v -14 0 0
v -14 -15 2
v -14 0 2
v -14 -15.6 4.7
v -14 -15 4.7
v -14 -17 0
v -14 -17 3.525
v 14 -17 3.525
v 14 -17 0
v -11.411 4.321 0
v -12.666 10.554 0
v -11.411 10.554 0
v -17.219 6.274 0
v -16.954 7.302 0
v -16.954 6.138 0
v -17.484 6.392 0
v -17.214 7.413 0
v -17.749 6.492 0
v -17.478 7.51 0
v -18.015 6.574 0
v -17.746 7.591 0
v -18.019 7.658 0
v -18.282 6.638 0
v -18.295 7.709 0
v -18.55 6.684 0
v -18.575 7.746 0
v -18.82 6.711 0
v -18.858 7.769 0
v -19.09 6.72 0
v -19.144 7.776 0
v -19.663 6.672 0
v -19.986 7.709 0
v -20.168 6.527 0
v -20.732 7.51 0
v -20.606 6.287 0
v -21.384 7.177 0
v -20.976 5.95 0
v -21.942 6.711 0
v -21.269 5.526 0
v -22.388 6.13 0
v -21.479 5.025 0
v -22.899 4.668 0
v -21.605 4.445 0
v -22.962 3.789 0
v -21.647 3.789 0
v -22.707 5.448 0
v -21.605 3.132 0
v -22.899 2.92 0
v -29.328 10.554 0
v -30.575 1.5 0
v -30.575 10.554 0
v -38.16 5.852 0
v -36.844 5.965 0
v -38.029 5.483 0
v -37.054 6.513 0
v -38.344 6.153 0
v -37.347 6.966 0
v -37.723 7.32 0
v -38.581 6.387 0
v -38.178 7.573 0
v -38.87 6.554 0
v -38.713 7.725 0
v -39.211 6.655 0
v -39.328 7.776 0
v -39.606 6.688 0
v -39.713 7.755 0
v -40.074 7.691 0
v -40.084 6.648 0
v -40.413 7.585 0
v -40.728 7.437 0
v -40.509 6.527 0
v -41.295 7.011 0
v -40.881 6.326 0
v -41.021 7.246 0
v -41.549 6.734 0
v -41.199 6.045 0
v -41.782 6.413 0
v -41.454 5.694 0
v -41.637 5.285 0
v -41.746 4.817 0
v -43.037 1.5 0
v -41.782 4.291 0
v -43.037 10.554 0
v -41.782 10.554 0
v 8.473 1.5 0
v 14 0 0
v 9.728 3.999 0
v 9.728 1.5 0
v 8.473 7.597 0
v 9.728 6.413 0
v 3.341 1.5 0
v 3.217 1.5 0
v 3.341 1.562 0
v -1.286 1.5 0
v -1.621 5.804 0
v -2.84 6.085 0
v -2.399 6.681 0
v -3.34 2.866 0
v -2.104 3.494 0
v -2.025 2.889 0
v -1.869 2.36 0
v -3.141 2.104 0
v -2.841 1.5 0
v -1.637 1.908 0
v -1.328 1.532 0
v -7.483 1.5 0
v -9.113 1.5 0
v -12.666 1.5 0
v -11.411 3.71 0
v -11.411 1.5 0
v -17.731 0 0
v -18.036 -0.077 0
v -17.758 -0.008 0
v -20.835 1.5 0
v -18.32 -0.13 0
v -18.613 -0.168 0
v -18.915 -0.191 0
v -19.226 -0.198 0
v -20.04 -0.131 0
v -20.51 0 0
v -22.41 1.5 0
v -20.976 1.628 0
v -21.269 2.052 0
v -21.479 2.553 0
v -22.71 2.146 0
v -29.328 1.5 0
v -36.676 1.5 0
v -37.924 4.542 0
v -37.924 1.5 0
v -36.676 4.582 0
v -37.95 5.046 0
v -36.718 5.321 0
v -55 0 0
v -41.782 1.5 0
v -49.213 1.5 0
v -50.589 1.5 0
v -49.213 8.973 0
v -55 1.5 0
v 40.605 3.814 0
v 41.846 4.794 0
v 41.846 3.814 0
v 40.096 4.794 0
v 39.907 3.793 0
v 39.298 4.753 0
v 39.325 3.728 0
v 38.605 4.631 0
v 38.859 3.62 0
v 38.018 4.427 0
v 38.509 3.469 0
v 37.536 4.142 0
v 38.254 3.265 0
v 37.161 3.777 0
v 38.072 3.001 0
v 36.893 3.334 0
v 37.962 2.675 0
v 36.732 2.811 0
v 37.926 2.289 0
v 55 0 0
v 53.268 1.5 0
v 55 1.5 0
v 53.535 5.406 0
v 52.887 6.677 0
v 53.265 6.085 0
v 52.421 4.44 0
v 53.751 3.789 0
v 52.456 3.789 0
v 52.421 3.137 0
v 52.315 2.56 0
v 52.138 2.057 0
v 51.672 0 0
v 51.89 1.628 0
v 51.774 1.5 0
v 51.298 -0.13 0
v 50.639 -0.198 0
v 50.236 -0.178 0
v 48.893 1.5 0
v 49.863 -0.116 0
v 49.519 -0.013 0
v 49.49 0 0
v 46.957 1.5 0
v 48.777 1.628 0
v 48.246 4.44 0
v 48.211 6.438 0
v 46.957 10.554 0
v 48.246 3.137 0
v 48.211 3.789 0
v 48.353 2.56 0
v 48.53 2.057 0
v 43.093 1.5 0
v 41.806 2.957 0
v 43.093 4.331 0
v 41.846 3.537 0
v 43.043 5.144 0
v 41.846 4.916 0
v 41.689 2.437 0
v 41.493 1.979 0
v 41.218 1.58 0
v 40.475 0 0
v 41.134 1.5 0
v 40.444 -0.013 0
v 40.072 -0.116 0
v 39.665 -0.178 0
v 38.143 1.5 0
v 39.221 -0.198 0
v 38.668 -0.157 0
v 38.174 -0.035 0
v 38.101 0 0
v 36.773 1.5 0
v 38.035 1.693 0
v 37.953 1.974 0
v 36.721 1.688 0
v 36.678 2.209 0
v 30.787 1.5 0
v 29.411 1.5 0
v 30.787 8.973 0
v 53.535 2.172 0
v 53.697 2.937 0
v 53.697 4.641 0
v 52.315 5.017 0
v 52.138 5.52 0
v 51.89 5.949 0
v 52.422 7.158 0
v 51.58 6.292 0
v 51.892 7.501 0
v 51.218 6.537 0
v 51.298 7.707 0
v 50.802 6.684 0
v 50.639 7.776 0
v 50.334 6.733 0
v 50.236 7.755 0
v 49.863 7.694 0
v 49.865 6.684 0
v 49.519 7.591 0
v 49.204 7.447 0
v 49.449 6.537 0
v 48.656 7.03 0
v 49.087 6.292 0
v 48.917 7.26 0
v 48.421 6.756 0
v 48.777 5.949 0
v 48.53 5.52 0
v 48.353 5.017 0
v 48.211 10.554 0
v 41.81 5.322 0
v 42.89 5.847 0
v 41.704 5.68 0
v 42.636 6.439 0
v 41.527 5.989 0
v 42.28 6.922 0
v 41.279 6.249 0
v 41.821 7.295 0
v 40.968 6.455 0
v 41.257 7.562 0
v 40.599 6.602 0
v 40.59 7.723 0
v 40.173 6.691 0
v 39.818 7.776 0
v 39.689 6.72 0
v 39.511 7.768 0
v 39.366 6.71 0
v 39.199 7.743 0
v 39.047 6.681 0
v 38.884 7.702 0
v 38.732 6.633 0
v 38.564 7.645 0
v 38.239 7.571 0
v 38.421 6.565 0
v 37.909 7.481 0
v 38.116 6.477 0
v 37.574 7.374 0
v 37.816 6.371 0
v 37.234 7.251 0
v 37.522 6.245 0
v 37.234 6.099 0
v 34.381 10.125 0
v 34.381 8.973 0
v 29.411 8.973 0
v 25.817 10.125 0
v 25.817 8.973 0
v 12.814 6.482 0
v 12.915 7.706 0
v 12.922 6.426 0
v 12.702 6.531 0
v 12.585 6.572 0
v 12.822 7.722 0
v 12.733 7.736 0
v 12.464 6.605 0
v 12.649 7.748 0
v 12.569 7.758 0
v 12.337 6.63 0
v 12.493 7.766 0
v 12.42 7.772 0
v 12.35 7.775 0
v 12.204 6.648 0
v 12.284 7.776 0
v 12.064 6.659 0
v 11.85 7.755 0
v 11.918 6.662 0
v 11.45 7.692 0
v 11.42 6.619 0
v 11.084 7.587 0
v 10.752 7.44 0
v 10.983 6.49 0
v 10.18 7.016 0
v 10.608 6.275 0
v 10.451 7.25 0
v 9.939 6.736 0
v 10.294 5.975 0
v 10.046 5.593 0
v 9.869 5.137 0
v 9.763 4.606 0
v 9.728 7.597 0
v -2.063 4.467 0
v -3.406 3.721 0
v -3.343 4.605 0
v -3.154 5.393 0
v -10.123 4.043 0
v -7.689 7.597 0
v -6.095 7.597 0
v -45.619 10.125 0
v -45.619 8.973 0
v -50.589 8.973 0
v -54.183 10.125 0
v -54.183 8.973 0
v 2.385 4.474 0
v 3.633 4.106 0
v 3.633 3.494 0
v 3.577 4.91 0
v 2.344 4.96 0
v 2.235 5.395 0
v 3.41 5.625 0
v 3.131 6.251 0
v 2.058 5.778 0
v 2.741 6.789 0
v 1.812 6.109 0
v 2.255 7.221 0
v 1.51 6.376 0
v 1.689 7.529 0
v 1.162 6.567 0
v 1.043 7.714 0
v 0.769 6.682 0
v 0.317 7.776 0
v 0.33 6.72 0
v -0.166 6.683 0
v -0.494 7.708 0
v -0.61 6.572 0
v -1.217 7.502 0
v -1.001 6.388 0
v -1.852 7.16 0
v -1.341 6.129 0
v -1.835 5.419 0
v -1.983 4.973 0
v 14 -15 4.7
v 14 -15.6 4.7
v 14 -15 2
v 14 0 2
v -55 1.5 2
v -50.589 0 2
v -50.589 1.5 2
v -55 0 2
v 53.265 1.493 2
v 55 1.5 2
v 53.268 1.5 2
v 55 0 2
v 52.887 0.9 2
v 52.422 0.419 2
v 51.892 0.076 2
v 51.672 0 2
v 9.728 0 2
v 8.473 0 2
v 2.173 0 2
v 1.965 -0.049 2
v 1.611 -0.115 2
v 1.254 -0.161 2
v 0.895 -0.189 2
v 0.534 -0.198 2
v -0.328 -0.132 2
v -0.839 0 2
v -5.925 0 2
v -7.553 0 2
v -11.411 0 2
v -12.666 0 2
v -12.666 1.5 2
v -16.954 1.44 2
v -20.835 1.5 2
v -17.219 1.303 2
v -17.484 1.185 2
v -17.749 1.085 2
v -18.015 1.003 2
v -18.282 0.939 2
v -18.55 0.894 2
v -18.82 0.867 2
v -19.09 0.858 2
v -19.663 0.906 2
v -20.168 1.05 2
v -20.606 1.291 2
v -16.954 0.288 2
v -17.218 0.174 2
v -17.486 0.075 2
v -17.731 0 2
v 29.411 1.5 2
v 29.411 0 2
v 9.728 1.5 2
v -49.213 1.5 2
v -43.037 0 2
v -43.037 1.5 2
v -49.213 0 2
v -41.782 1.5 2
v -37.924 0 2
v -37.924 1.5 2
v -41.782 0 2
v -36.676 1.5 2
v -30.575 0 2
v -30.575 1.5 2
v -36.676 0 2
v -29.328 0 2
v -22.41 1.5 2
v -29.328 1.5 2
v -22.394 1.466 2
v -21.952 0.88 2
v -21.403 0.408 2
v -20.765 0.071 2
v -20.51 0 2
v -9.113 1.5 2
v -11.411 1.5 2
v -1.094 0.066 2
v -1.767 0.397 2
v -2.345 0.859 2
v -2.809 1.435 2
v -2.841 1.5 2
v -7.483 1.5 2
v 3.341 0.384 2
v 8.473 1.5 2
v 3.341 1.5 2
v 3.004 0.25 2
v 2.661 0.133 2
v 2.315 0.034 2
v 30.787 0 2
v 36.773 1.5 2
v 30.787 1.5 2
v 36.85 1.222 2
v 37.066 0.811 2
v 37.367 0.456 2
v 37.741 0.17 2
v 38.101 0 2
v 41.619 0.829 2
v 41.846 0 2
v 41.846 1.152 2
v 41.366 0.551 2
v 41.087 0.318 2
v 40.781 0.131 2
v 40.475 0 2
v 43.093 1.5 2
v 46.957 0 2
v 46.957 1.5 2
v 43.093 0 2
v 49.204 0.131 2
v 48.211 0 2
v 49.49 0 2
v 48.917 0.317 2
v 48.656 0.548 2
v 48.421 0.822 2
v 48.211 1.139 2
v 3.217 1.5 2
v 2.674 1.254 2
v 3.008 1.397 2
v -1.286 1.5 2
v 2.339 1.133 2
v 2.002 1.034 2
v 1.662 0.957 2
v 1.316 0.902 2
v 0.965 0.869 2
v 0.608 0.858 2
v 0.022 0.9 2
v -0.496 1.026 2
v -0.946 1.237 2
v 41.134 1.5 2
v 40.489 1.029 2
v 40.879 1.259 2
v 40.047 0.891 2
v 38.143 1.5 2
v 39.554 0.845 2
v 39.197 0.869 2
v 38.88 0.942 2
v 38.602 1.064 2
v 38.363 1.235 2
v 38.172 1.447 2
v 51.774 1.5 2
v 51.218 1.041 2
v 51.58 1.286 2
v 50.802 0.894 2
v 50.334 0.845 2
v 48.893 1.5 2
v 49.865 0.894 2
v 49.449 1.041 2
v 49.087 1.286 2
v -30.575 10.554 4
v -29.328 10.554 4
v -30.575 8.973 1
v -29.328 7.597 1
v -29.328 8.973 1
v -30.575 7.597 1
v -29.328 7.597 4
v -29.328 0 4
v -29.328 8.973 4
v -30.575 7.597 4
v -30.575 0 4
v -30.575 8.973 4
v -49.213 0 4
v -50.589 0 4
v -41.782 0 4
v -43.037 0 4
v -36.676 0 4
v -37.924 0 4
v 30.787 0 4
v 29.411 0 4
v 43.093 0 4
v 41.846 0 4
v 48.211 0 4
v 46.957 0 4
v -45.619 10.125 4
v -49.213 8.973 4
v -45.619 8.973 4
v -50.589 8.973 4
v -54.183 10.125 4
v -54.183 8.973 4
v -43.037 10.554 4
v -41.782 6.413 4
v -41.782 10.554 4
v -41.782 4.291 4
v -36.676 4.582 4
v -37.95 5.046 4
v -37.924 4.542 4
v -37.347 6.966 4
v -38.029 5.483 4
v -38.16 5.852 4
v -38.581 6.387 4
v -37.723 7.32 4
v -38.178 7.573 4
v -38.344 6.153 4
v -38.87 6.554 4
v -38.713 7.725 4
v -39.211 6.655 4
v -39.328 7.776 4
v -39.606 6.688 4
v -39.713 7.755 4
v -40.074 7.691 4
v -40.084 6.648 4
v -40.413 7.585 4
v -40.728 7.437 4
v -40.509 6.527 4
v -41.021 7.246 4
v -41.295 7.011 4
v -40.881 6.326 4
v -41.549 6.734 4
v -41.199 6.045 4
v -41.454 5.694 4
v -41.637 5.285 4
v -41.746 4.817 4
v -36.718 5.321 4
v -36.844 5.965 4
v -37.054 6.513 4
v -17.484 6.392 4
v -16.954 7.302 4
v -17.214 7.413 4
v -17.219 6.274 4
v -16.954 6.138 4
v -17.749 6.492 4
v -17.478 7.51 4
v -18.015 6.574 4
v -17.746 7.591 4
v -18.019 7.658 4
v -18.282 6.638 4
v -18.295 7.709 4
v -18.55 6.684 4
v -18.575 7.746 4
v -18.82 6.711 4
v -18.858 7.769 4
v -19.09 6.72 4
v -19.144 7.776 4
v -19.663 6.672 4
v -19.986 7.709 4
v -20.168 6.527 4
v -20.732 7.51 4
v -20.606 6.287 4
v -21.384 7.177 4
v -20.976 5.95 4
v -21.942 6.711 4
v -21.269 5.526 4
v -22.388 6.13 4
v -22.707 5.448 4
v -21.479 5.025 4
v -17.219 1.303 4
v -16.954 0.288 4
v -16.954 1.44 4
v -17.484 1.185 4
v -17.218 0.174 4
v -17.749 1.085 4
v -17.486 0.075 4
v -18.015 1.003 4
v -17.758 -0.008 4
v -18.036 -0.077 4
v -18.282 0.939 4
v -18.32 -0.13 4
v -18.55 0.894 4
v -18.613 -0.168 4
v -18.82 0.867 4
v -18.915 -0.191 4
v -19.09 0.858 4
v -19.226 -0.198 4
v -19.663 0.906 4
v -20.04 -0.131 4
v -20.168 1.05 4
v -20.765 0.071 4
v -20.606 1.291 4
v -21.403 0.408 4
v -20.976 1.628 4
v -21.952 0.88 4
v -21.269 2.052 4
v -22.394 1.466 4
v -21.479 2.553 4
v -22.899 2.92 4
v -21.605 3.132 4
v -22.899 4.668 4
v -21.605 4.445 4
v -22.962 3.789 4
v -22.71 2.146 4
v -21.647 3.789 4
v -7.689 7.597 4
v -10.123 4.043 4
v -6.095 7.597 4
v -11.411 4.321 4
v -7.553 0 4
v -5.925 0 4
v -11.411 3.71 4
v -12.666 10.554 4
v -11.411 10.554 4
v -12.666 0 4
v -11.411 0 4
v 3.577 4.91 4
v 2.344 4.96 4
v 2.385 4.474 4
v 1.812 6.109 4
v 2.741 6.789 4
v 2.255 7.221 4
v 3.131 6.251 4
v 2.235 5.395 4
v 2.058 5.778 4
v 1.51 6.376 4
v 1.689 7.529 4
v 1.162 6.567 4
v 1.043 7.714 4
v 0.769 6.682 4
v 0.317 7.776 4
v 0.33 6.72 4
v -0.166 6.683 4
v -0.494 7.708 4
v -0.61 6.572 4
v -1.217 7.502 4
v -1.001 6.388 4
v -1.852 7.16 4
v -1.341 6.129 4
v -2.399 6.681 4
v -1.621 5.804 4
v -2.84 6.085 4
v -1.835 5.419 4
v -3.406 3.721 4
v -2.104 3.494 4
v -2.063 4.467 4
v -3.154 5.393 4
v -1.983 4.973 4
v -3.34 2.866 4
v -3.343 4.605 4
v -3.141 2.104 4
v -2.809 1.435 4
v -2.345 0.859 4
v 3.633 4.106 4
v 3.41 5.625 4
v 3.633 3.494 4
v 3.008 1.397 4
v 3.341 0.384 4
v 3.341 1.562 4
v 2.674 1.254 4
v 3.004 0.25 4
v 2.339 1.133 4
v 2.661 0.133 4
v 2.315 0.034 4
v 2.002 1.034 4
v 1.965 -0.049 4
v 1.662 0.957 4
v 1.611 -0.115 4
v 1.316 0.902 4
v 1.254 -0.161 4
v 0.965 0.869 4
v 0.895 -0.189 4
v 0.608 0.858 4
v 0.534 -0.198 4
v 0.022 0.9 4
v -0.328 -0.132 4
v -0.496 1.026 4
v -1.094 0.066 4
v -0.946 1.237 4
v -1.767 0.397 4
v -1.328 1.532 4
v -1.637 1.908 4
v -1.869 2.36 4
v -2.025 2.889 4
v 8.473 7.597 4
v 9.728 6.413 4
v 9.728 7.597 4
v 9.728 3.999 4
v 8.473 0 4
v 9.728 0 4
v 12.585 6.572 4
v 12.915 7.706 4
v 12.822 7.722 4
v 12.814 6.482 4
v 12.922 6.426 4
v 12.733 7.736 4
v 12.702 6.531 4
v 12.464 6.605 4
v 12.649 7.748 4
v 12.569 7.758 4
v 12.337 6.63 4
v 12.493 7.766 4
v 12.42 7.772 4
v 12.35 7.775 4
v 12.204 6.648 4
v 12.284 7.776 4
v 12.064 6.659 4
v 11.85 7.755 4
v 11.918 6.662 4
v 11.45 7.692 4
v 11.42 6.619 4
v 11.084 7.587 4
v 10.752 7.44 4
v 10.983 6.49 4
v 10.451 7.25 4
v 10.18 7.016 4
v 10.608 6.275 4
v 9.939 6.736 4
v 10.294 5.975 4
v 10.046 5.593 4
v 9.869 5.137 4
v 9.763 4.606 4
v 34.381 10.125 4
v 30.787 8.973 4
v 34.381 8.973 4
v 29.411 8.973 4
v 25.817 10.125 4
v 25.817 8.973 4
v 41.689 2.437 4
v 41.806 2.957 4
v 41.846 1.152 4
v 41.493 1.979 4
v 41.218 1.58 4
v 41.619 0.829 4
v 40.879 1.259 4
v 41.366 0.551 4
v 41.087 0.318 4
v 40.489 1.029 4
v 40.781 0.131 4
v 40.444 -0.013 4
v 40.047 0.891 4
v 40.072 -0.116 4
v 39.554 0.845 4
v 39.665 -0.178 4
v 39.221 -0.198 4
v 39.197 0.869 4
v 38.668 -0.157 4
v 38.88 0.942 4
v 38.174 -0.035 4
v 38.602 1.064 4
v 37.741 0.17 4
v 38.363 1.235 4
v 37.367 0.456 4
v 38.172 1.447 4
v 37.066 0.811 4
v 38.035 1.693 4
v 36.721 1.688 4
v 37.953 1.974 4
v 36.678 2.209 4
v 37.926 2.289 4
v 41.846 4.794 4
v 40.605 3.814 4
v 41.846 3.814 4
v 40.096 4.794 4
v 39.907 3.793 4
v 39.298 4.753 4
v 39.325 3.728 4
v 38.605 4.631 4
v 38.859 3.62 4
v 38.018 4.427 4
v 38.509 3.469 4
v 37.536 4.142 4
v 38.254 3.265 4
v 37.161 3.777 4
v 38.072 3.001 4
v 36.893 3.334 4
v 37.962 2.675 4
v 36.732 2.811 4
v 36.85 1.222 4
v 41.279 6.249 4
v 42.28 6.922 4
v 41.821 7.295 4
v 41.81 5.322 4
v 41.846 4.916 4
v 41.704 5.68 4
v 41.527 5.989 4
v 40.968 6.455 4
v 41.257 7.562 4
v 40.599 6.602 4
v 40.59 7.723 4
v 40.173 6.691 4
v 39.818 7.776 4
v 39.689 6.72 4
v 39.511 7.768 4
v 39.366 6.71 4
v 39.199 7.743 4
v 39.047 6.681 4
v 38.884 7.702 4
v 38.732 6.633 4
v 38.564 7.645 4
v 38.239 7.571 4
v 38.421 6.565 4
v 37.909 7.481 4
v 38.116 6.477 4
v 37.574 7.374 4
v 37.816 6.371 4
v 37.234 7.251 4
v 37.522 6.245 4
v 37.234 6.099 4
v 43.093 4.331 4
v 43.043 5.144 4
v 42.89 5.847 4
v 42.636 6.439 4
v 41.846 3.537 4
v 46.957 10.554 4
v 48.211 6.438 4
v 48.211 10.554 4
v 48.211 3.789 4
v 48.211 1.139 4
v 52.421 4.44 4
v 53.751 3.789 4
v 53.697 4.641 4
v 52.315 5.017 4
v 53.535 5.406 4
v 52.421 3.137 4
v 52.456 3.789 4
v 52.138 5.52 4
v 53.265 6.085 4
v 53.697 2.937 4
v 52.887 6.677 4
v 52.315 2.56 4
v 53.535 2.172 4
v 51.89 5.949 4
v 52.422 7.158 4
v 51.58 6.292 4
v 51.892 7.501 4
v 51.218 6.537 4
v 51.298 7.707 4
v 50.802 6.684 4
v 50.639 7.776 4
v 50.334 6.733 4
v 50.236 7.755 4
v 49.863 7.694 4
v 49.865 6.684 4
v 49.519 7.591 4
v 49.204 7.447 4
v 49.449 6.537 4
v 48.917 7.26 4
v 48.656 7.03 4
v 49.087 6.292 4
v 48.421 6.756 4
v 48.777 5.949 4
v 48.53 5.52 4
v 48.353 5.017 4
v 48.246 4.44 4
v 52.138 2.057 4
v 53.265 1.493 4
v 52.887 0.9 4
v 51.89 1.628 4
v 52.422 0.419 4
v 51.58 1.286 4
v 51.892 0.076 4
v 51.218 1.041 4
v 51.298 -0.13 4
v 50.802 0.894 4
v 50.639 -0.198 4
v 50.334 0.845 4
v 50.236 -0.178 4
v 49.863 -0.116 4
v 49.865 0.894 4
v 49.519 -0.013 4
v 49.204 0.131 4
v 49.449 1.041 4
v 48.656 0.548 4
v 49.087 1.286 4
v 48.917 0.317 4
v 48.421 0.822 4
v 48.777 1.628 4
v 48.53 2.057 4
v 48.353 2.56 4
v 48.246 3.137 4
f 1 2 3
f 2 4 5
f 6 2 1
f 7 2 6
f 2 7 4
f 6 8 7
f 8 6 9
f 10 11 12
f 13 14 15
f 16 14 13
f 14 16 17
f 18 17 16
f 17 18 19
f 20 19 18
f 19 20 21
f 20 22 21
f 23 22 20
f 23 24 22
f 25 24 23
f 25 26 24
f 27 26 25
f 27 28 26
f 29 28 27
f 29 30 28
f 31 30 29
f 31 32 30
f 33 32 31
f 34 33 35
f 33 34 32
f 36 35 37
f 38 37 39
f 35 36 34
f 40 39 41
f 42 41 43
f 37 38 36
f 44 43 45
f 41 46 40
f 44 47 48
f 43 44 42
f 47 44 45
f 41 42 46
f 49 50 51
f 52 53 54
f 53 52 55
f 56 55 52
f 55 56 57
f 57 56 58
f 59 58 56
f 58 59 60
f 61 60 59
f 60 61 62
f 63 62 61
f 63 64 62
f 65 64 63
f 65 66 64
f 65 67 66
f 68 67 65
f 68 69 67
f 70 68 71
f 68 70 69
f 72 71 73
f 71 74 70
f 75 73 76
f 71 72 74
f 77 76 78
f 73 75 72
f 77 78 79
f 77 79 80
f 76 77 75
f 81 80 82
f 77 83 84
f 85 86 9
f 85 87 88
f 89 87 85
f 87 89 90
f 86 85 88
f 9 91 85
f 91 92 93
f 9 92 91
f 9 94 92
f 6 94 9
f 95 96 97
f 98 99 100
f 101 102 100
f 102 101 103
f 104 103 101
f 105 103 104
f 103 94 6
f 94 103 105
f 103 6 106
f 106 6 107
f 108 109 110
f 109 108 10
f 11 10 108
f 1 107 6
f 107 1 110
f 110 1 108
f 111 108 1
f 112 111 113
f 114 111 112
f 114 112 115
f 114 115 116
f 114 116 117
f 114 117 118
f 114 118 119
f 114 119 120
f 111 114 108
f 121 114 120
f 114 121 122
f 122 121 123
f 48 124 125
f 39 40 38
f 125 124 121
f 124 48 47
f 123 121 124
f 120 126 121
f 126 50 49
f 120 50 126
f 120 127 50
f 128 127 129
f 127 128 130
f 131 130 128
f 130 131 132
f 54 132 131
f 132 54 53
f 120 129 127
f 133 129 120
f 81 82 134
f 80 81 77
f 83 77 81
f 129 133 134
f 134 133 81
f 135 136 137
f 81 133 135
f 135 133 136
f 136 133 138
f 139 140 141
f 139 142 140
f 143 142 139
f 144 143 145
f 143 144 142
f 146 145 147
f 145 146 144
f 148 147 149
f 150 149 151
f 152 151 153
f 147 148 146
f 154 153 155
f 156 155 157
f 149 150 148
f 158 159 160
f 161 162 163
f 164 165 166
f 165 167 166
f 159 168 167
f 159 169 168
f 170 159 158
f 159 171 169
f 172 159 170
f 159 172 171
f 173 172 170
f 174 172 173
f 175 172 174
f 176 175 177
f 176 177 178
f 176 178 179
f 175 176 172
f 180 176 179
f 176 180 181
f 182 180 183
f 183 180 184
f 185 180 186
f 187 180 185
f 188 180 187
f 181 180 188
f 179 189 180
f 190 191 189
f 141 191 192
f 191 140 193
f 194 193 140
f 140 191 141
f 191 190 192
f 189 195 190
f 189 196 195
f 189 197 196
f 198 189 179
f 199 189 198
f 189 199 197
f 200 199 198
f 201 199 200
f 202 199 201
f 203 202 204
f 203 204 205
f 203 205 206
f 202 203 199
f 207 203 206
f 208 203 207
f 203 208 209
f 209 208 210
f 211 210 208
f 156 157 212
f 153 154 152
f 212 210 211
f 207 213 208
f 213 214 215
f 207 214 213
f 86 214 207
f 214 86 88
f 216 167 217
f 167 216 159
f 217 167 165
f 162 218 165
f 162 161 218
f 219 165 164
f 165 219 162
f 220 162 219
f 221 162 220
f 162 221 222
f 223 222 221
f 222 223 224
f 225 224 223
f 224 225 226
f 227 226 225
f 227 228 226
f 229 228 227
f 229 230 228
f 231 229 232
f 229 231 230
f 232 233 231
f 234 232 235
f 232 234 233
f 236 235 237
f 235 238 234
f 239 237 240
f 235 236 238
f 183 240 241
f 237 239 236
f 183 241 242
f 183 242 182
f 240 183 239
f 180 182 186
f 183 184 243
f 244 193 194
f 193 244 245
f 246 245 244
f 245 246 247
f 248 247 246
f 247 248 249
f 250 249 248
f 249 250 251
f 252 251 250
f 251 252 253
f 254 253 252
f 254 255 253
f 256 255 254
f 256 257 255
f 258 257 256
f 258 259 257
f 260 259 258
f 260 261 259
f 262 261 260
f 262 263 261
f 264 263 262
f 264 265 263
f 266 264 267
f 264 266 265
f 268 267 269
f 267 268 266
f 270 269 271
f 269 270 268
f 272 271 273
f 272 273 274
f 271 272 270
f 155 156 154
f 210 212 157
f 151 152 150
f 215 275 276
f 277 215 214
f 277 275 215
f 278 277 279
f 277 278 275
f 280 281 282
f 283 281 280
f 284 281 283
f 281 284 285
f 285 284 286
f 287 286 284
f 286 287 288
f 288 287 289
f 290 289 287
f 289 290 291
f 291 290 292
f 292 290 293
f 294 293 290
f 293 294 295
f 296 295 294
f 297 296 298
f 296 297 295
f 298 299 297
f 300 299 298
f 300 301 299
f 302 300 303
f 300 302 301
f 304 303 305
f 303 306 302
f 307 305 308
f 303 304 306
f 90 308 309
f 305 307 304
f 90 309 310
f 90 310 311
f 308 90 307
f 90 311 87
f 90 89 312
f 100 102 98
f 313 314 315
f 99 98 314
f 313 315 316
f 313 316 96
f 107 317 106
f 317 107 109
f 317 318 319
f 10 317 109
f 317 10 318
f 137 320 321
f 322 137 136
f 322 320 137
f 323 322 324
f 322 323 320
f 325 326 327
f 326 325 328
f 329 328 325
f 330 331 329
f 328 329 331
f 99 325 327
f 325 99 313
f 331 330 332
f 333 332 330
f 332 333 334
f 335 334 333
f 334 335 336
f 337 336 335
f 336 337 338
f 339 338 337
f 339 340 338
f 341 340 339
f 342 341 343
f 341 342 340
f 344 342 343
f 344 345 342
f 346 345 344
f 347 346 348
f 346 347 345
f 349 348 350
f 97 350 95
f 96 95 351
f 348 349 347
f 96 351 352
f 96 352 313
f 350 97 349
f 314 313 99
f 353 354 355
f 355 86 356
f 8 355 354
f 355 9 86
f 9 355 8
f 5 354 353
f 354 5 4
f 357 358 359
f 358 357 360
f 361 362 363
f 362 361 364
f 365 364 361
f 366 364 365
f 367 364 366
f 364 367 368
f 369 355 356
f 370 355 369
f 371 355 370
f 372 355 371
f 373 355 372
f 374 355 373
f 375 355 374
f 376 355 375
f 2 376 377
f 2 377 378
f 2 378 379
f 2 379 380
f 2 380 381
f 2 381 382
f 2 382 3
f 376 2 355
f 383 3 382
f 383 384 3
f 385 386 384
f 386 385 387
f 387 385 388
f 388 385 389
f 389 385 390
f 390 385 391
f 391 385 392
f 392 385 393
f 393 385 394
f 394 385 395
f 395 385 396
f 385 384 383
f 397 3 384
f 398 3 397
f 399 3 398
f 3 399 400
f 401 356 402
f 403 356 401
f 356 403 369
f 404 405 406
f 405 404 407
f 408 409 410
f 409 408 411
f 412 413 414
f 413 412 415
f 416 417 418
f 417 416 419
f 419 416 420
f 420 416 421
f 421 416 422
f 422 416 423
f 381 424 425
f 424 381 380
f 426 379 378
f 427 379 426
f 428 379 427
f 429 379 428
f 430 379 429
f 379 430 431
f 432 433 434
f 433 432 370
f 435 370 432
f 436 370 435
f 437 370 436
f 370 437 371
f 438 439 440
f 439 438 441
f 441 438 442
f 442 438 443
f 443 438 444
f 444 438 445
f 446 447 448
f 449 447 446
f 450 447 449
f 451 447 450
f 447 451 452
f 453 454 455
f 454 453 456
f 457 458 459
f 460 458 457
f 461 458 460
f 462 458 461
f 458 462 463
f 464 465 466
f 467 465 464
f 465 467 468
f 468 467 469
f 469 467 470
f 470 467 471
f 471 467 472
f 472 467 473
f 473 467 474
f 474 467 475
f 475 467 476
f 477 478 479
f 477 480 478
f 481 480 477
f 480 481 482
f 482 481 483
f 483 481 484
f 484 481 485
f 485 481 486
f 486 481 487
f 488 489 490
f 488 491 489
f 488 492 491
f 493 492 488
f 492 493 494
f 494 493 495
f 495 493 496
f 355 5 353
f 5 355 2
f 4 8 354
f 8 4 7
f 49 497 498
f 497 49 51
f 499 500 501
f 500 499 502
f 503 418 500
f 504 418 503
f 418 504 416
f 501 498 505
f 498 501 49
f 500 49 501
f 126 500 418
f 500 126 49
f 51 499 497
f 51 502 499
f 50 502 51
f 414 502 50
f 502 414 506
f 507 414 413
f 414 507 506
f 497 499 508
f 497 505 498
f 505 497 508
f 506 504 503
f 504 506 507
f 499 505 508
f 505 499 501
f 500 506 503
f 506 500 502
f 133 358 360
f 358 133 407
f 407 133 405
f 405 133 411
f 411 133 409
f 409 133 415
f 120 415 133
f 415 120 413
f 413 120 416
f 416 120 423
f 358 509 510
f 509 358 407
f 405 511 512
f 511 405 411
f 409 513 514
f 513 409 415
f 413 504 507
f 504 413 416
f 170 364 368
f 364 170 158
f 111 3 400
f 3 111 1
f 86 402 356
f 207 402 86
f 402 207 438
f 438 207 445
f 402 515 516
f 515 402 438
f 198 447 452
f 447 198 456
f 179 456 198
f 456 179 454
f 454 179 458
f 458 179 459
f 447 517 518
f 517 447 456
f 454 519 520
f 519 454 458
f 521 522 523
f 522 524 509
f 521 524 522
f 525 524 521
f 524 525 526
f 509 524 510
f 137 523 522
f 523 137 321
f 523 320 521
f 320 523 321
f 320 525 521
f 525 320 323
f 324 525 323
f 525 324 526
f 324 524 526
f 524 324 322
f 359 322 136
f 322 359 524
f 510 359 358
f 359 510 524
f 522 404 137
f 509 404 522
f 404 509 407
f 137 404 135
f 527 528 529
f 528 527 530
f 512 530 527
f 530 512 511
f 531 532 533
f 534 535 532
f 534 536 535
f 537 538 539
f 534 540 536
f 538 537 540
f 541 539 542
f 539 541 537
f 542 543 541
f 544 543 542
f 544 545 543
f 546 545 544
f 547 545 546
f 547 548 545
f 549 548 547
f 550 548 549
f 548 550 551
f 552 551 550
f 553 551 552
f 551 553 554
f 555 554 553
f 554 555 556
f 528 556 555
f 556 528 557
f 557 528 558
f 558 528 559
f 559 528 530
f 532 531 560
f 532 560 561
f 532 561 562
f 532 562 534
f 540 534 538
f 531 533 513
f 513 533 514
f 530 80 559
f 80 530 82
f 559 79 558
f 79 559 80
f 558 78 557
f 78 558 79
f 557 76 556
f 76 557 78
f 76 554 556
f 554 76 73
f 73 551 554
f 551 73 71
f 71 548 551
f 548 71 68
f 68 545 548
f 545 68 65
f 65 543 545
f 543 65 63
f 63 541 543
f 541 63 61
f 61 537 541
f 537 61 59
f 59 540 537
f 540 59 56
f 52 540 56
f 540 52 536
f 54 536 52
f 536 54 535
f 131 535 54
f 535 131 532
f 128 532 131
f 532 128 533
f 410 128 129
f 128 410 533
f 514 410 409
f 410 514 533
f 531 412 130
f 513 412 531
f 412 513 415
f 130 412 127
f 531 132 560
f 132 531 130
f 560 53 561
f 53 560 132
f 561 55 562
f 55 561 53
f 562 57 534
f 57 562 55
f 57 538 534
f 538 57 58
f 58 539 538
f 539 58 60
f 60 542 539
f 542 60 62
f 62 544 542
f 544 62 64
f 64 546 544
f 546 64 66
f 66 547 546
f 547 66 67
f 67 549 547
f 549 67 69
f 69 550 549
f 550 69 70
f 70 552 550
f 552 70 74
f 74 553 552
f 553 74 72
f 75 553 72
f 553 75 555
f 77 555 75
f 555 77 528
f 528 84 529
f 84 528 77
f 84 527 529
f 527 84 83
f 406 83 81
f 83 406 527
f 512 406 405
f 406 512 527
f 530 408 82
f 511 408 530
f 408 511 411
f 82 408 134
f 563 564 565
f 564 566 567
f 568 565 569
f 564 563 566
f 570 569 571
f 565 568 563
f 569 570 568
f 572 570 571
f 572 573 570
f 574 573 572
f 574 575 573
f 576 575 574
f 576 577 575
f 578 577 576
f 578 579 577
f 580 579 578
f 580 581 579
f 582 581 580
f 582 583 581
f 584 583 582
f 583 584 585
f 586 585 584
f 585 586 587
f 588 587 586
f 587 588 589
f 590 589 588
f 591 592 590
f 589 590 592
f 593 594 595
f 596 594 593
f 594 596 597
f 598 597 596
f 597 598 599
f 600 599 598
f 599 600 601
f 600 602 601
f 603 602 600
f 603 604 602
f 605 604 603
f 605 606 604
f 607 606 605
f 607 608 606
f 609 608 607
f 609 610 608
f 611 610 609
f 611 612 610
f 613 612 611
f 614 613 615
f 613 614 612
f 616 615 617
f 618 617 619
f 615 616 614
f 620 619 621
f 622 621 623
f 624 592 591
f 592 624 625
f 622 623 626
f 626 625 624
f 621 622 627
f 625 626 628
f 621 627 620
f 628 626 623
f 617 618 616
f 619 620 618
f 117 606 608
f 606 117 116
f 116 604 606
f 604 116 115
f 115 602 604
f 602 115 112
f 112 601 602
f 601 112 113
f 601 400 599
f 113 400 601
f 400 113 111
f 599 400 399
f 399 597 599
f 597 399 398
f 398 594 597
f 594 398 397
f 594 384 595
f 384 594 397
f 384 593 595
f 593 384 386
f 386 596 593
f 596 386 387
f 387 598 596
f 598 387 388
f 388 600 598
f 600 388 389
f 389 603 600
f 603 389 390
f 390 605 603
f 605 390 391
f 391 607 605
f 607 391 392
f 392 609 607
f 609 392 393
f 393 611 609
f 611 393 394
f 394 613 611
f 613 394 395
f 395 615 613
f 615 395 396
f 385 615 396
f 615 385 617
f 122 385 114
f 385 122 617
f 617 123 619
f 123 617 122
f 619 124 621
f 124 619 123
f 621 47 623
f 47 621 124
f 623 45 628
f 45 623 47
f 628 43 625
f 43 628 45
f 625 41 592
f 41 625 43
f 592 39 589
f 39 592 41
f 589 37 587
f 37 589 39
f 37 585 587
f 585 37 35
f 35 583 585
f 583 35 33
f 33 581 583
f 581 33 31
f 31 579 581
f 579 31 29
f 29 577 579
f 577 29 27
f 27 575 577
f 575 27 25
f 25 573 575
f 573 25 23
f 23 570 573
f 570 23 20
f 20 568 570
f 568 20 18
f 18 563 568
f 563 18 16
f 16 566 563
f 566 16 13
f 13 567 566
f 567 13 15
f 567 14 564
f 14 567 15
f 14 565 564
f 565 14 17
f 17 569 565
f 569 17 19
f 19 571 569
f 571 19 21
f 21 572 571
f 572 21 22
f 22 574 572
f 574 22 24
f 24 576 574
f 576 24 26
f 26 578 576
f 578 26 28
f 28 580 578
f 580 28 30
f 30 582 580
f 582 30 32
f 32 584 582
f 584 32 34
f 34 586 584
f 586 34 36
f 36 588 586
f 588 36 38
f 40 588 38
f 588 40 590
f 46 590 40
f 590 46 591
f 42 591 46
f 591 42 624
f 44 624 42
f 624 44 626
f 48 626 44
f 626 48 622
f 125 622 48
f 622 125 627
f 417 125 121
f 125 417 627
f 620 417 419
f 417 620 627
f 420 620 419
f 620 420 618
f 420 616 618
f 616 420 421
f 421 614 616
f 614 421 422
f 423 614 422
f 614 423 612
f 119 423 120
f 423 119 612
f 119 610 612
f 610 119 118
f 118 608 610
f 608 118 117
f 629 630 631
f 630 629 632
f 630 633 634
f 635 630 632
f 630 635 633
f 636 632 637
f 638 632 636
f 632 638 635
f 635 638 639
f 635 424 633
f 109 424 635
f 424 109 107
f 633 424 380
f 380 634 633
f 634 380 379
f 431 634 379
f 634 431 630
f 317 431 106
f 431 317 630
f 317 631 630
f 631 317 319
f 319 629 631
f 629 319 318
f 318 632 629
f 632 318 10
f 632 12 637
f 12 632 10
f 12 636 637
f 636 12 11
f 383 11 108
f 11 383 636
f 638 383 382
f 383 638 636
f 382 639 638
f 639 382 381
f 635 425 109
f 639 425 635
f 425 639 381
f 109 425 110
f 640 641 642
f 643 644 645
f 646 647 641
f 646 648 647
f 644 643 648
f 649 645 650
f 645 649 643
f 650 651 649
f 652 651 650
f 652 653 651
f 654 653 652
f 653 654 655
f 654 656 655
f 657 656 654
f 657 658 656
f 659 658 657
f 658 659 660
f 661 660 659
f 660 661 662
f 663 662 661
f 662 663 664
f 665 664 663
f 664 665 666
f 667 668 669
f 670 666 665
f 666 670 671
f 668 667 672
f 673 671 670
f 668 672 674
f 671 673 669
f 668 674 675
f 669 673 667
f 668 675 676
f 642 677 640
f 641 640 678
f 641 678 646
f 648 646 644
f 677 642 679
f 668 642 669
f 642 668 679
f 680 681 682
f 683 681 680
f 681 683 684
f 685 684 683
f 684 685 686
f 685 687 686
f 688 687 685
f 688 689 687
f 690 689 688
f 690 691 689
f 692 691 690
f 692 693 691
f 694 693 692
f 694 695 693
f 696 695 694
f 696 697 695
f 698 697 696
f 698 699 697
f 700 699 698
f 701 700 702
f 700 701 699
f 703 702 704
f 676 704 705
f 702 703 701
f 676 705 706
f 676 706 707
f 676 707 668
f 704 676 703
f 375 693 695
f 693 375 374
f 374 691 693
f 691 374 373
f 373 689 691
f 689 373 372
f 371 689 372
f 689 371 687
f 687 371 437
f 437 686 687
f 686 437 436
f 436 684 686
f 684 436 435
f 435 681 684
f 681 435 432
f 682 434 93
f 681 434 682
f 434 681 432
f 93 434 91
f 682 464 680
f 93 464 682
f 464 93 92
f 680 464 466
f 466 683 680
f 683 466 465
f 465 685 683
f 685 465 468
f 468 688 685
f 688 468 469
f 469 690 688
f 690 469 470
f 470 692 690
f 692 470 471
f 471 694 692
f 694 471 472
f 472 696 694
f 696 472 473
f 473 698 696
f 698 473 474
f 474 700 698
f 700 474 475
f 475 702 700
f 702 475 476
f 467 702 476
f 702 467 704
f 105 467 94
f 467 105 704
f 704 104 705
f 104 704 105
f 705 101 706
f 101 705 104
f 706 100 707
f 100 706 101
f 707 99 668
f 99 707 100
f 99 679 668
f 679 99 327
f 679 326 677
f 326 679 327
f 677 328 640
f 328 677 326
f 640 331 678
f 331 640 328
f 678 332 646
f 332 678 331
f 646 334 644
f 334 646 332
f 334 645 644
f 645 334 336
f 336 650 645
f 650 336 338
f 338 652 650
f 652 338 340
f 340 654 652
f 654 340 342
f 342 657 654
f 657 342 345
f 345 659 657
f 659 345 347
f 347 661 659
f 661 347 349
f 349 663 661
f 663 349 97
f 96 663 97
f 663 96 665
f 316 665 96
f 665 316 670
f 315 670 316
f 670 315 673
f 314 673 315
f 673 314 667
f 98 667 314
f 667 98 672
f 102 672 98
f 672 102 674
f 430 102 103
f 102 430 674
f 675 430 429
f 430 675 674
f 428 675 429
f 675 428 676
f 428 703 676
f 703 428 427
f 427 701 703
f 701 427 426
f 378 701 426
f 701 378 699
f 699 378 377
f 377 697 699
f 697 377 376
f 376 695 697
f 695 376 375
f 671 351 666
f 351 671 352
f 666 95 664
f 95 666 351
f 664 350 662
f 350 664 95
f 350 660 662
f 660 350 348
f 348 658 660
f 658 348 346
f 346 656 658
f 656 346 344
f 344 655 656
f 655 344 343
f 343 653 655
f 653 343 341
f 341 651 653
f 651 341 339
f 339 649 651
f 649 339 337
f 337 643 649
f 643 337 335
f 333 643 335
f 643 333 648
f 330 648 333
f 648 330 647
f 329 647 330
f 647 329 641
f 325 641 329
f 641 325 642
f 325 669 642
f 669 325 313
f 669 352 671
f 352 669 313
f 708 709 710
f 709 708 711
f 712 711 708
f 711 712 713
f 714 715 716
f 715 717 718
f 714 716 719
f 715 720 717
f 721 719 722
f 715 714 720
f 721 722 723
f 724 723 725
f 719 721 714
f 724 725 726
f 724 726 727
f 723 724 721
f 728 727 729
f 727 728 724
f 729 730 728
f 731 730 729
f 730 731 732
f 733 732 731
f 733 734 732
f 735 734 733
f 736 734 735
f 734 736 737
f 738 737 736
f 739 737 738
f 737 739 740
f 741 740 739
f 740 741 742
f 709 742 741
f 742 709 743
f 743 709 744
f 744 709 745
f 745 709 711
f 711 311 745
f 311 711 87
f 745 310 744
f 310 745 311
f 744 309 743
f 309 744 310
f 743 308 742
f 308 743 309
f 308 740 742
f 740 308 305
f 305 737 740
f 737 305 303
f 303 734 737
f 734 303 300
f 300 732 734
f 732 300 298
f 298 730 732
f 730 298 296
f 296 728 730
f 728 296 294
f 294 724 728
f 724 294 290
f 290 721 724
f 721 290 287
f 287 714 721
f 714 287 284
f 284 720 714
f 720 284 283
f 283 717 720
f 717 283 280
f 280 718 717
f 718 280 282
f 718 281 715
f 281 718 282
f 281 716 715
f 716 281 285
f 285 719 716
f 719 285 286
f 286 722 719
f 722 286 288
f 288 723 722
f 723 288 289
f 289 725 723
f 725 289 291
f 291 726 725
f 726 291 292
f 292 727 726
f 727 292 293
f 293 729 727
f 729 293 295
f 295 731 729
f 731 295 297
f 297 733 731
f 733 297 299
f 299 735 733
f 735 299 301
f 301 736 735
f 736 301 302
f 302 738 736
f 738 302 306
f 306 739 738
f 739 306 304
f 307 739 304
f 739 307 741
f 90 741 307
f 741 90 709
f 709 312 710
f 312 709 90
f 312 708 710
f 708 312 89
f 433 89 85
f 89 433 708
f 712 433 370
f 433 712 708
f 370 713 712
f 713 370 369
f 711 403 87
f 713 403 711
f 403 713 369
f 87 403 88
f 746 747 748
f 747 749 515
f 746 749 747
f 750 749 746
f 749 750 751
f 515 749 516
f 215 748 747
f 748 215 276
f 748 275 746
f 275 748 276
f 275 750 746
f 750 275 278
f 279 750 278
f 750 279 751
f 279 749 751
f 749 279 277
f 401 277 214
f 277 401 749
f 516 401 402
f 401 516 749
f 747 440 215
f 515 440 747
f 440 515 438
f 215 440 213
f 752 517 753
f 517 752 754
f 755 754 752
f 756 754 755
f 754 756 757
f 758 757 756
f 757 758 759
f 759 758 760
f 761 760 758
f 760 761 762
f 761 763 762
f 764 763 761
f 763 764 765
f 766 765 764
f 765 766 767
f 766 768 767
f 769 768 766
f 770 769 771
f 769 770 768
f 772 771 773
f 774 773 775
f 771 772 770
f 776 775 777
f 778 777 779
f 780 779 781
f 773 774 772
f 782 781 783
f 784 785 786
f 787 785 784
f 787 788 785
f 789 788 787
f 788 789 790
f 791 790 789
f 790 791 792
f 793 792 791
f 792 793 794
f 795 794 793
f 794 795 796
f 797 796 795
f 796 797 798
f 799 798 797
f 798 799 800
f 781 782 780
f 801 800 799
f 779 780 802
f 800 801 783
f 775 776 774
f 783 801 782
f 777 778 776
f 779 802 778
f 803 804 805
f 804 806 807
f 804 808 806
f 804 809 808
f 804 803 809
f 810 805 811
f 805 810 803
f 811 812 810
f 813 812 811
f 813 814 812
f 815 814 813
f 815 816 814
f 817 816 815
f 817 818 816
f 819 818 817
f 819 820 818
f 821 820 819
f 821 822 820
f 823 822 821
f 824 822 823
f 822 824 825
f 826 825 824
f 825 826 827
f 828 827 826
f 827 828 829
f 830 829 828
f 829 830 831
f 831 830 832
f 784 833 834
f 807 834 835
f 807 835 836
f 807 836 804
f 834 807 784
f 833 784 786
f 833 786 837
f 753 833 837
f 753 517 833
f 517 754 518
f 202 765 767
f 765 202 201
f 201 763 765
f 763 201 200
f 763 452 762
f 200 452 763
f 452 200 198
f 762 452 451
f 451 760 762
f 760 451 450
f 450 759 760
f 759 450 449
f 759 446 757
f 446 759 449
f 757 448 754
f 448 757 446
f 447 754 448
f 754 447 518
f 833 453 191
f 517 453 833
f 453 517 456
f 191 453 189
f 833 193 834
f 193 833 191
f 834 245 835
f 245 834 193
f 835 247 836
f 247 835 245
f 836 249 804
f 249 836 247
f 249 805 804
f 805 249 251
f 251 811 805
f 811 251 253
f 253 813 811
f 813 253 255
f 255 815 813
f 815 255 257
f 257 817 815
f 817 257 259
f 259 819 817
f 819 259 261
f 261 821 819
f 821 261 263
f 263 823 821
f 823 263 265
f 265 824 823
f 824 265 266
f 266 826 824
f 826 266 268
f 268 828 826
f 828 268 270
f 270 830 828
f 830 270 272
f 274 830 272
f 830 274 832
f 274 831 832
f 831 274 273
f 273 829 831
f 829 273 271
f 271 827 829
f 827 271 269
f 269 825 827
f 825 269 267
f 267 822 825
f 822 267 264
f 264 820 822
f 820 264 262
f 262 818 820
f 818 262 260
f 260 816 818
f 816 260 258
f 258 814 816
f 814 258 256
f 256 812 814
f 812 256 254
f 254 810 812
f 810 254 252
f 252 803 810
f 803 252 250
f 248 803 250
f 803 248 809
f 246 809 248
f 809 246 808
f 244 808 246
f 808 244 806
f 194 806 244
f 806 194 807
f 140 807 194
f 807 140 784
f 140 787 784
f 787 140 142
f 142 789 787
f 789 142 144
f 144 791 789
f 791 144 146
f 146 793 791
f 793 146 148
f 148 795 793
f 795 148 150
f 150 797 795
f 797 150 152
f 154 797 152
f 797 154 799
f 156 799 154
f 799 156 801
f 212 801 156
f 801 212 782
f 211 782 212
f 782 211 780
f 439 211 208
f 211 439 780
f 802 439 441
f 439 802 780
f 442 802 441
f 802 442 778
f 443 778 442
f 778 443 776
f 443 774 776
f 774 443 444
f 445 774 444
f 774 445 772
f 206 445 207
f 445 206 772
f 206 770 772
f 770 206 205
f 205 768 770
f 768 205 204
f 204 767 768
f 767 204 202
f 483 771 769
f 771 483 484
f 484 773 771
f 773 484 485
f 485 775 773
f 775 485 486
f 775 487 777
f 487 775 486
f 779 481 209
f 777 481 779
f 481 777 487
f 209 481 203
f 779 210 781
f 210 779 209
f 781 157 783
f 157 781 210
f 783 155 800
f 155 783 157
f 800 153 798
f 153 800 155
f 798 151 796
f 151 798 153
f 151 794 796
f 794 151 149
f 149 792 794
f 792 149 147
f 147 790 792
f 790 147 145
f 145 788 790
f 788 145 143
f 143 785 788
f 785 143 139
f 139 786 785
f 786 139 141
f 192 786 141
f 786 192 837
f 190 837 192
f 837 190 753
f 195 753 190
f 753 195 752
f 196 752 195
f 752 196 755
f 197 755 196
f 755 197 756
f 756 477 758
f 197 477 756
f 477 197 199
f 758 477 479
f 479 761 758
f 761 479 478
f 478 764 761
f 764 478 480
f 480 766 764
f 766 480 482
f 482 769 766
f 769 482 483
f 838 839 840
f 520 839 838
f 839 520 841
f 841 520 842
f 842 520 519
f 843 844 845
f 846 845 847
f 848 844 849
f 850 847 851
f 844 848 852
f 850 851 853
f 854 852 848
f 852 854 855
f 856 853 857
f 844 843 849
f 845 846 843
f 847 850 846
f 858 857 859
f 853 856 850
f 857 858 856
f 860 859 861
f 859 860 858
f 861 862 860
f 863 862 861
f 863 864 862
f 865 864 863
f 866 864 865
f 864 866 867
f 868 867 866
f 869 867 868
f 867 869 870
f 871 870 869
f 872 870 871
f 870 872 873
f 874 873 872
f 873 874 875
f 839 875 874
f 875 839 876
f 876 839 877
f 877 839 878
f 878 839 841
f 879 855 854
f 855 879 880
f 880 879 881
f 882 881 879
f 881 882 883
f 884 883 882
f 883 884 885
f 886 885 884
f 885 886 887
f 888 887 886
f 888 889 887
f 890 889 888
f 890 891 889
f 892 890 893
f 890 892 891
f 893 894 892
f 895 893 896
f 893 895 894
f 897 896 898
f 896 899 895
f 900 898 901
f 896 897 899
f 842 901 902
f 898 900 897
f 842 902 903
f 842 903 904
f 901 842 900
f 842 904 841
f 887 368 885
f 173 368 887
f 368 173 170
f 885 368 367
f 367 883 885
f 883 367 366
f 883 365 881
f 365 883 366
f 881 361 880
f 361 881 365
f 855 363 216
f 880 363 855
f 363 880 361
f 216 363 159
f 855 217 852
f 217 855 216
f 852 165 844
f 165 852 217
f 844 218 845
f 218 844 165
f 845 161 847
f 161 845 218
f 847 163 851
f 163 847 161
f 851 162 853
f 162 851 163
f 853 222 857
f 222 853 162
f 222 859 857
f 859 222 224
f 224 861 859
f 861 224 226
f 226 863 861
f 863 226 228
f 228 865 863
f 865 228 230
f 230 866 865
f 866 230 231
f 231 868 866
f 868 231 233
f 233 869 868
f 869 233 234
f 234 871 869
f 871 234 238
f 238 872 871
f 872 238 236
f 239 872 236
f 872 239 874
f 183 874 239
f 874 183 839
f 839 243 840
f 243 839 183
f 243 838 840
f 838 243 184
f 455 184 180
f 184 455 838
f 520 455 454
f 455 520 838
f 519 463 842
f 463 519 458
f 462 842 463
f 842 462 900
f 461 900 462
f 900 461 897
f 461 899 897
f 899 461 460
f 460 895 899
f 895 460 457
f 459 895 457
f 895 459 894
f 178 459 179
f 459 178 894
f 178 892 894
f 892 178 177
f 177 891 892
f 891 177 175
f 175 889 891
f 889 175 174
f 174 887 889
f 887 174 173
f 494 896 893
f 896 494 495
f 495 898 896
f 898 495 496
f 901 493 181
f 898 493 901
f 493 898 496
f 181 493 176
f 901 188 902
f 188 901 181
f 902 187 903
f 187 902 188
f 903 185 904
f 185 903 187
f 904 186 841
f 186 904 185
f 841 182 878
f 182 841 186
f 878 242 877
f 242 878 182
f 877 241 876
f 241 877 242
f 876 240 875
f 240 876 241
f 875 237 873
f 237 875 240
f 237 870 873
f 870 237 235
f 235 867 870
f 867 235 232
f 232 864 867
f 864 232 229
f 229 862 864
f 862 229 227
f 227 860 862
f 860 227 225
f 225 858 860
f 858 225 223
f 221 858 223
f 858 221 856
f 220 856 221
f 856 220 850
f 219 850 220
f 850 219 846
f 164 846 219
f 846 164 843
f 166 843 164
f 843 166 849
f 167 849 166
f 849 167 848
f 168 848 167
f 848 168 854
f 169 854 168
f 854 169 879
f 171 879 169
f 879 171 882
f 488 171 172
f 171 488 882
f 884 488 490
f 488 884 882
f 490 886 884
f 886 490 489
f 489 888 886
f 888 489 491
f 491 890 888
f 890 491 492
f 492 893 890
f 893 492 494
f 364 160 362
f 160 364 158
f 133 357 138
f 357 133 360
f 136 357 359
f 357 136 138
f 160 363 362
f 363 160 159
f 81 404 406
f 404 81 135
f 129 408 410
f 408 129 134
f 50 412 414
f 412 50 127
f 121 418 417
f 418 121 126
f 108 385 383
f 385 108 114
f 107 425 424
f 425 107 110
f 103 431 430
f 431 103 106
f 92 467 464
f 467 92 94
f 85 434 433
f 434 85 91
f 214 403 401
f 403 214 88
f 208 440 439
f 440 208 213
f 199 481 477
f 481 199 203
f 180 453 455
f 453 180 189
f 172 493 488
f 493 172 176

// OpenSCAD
//Hardhat accessory slot tab
//Writen by Dan Koss 1/2016. (Updated 1/23/16)
//Thanks to MC Geisler (thing:714444) for the font list. I'm still figuring out text and will trim don the list as I learn.
//Choose to import STL or Use custom text

/* [Add Text] */
//Text Line 1
line1 = "";
//Text Line 2
line2 = "";
//Text Line 3
line3 = "";
//Text Line 4
line4 = "Thicker Tab";

//Font name, e.g. "Libration Sans", "Aldo", depends on what is available on the platform. In the customizer,choose from about 700 Google Fonts. For an overview please refer: http://www.google.com/fonts
FontName="Alike"; //[ABeeZee,Abel,Abril Fatface,Aclonica,Acme,Actor,Adamina,Advent Pro,Aguafina Script,Akronim,Aladin,Aldrich,Alef,Alegreya,Alegreya Sans,Alegreya Sans SC,Alegreya SC,Alex Brush,Alfa Slab One,Alice,Alike,Alike Angular,Allan,Allerta,Allerta Stencil,Allura,Almendra,Almendra Display,Almendra SC,Amarante,Amaranth,Amatic SC,Amethysta,Amiri,Anaheim,Andada,Andika,Angkor,Annie Use Your Telescope,Anonymous Pro,Antic,Antic Didone,Antic Slab,Anton,Arapey,Arbutus,Arbutus Slab,Architects Daughter,Archivo Black,Archivo Narrow,Arimo,Arizonia,Armata,Artifika,Arvo,Asap,Asset,Astloch,Asul,Atomic Age,Aubrey,Audiowide,Autour One,Average,Average Sans,Averia Gruesa Libre,Averia Libre,Averia Sans Libre,Averia Serif Libre,Bad Script,Balthazar,Bangers,Basic,Battambang,Baumans,Bayon,Belgrano,Belleza,BenchNine,Bentham,Berkshire Swash,Bevan,Bigelow Rules,Bigshot One,Bilbo,Bilbo Swash Caps,Bitter,Black Ops One,Bokor,Bonbon,Boogaloo,Bowlby One,Bowlby One SC,Brawler,Bree Serif,Bubblegum Sans,Bubbler One,Buda,Buenard,Butcherman,Butterfly Kids,Cabin,Cabin Condensed,Cabin Sketch,Caesar Dressing,Cagliostro,Calligraffitti,Cambay,Cambo,Candal,Cantarell,Cantata One,Cantora One,Capriola,Cardo,Carme,Carrois Gothic,Carrois Gothic SC,Carter One,Caudex,Cedarville Cursive,Ceviche One,Changa One,Chango,Chau Philomene One,Chela One,Chelsea Market,Chenla,Cherry Cream Soda,Cherry Swash,Chewy,Chicle,Chivo,Cinzel,Cinzel Decorative,Clicker Script,Coda,Coda Caption,Codystar,Combo,Comfortaa,Coming Soon,Concert One,Condiment,Content,Contrail One,Convergence,Cookie,Copse,Corben,Courgette,Cousine,Coustard,Covered By Your Grace,Crafty Girls,Creepster,Crete Round,Crimson Text,Croissant One,Crushed,Cuprum,Cutive,Cutive Mono,Damion,Dancing Script,Dangrek,Dawning of a New Day,Days One,Dekko,Delius,Delius Swash Caps,Delius Unicase,Della Respira,Denk One,Devonshire,Dhurjati,Didact Gothic,Diplomata,Diplomata SC,Domine,Donegal One,Doppio One,Dorsa,Dosis,Dr Sugiyama,Droid Sans,Droid Sans Mono,Droid Serif,Duru Sans,Dynalight,Eagle Lake,Eater,EB Garamond,Economica,Ek Mukta,Electrolize,Elsie,Elsie Swash Caps,Emblema One,Emilys Candy,Engagement,Englebert,Enriqueta,Erica One,Esteban,Euphoria Script,Ewert,Exo,Exo 2,Expletus Sans,Fanwood Text,Fascinate,Fascinate Inline,Faster One,Fasthand,Fauna One,Federant,Federo,Felipa,Fenix,Finger Paint,Fira Mono,Fira Sans,Fjalla One,Fjord One,Flamenco,Flavors,Fondamento,Fontdiner Swanky,Forum,Francois One,Freckle Face,Fredericka the Great,Fredoka One,Freehand,Fresca,Frijole,Fruktur,Fugaz One,Gabriela,Gafata,Galdeano,Galindo,Gentium Basic,Gentium Book Basic,Geo,Geostar,Geostar Fill,Germania One,GFS Didot,GFS Neohellenic,Gidugu,Gilda Display,Give You Glory,Glass Antiqua,Glegoo,Gloria Hallelujah,Goblin One,Gochi Hand,Gorditas,Goudy Bookletter 1911,Graduate,Grand Hotel,Gravitas One,Great Vibes,Griffy,Gruppo,Gudea,Gurajada,Habibi,Halant,Hammersmith One,Hanalei,Hanalei Fill,Handlee,Hanuman,Happy Monkey,Headland One,Henny Penny,Herr Von Muellerhoff,Hind,Holtwood One SC,Homemade Apple,Homenaje,Iceberg,Iceland,IM Fell Double Pica,IM Fell Double Pica SC,IM Fell DW Pica,IM Fell DW Pica SC,IM Fell English,IM Fell English SC,IM Fell French Canon,IM Fell French Canon SC,IM Fell Great Primer,IM Fell Great Primer SC,Imprima,Inconsolata,Inder,Indie Flower,Inika,Irish Grover,Istok Web,Italiana,Italianno,Jacques Francois,Jacques Francois Shadow,Jim Nightshade,Jockey One,Jolly Lodger,Josefin Sans,Josefin Slab,Joti One,Judson,Julee,Julius Sans One,Junge,Jura,Just Another Hand,Just Me Again Down Here,Kalam,Kameron,Kantumruy,Karla,Karma,Kaushan Script,Kavoon,Kdam Thmor,Keania One,Kelly Slab,Kenia,Khand,Khmer,Khula,Kite One,Knewave,Kotta One,Koulen,Kranky,Kreon,Kristi,Krona One,La Belle Aurore,Laila,Lakki Reddy,Lancelot,Lateef,Lato,League Script,Leckerli One,Ledger,Lekton,Lemon,Liberation Sans,Libre Baskerville,Life Savers,Lilita One,Lily Script One,Limelight,Linden Hill,Lobster,Lobster Two,Londrina Outline,Londrina Shadow,Londrina Sketch,Londrina Solid,Lora,Love Ya Like A Sister,Loved by the King,Lovers Quarrel,Luckiest Guy,Lusitana,Lustria,Macondo,Macondo Swash Caps,Magra,Maiden Orange,Mako,Mallanna,Mandali,Marcellus,Marcellus SC,Marck Script,Margarine,Marko One,Marmelad,Martel Sans,Marvel,Mate,Mate SC,Maven Pro,McLaren,Meddon,MedievalSharp,Medula One,Megrim,Meie Script,Merienda,Merienda One,Merriweather,Merriweather Sans,Metal,Metal Mania,Metamorphous,Metrophobic,Michroma,Milonga,Miltonian,Miltonian Tattoo,Miniver,Miss Fajardose,Modak,Modern Antiqua,Molengo,Molle,Monda,Monofett,Monoton,Monsieur La Doulaise,Montaga,Montez,Montserrat,Montserrat Alternates,Montserrat Subrayada,Moul,Moulpali,Mountains of Christmas,Mouse Memoirs,Mr Bedfort,Mr Dafoe,Mr De Haviland,Mrs Saint Delafield,Mrs Sheppards,Muli,Mystery Quest,Neucha,Neuton,New Rocker,News Cycle,Niconne,Nixie One,Nobile,Nokora,Norican,Nosifer,Nothing You Could Do,Noticia Text,Noto Sans,Noto Serif,Nova Cut,Nova Flat,Nova Mono,Nova Oval,Nova Round,Nova Script,Nova Slim,Nova Square,NTR,Numans,Nunito,Odor Mean Chey,Offside,Old Standard TT,Oldenburg,Oleo Script,Oleo Script Swash Caps,Open Sans,Open Sans Condensed,Oranienbaum,Orbitron,Oregano,Orienta,Original Surfer,Oswald,Over the Rainbow,Overlock,Overlock SC,Ovo,Oxygen,Oxygen Mono,Pacifico,Paprika,Parisienne,Passero One,Passion One,Pathway Gothic One,Patrick Hand,Patrick Hand SC,Patua One,Paytone One,Peddana,Peralta,Permanent Marker,Petit Formal Script,Petrona,Philosopher,Piedra,Pinyon Script,Pirata One,Plaster,Play,Playball,Playfair Display,Playfair Display SC,Podkova,Poiret One,Poller One,Poly,Pompiere,Pontano Sans,Port Lligat Sans,Port Lligat Slab,Prata,Preahvihear,Press Start 2P,Princess Sofia,Prociono,Prosto One,PT Mono,PT Sans,PT Sans Caption,PT Sans Narrow,PT Serif,PT Serif Caption,Puritan,Purple Purse,Quando,Quantico,Quattrocento,Quattrocento Sans,Questrial,Quicksand,Quintessential,Qwigley,Racing Sans One,Radley,Rajdhani,Raleway,Raleway Dots,Ramabhadra,Ramaraja,Rambla,Rammetto One,Ranchers,Rancho,Ranga,Rationale,Ravi Prakash,Redressed,Reenie Beanie,Revalia,Ribeye,Ribeye Marrow,Righteous,Risque,Roboto,Roboto Condensed,Roboto Slab,Rochester,Rock Salt,Rokkitt,Romanesco,Ropa Sans,Rosario,Rosarivo,Rouge Script,Rozha One,Rubik Mono One,Rubik One,Ruda,Rufina,Ruge Boogie,Ruluko,Rum Raisin,Ruslan Display,Russo One,Ruthie,Rye,Sacramento,Sail,Salsa,Sanchez,Sancreek,Sansita One,Sarina,Sarpanch,Satisfy,Scada,Scheherazade,Schoolbell,Seaweed Script,Sevillana,Seymour One,Shadows Into Light,Shadows Into Light Two,Shanti,Share,Share Tech,Share Tech Mono,Shojumaru,Short Stack,Siemreap,Sigmar One,Signika,Signika Negative,Simonetta,Sintony,Sirin Stencil,Six Caps,Skranji,Slabo 13px,Slabo 27px,Slackey,Smokum,Smythe,Sniglet,Snippet,Snowburst One,Sofadi One,Sofia,Sonsie One,Sorts Mill Goudy,Source Code Pro,Source Sans Pro,Source Serif Pro,Special Elite,Spicy Rice,Spinnaker,Spirax,Squada One,Sree Krushnadevaraya,Stalemate,Stalinist One,Stardos Stencil,Stint Ultra Condensed,Stint Ultra Expanded,Stoke,Strait,Sue Ellen Francisco,Sunshiney,Supermercado One,Suranna,Suravaram,Suwannaphum,Swanky and Moo Moo,Syncopate,Tangerine,Taprom,Tauri,Teko,Telex,Tenali Ramakrishna,Tenor Sans,Text Me One,The Girl Next Door,Tienne,Timmana,Tinos,Titan One,Titillium Web,Trade Winds,Trocchi,Trochut,Trykker,Tulpen One,Ubuntu,Ubuntu Condensed,Ubuntu Mono,Ultra,Uncial Antiqua,Underdog,Unica One,UnifrakturCook,UnifrakturMaguntia,Unkempt,Unlock,Unna,Vampiro One,Varela,Varela Round,Vast Shadow,Vesper Libre,Vibur,Vidaloka,Viga,Voces,Volkhov,Vollkorn,Voltaire,VT323,Waiting for the Sunrise,Wallpoet,Walter Turncoat,Warnes,Wellfleet,Wendy One,Wire One,Yanone Kaffeesatz,Yellowtail,Yeseva One,Yesteryear,Zeyada]
//Font Size
FontSize = 10; //[1:.5:30]
//Font Spacing
FontSpace = 1; //[0:.1:2]
//Font Extrusion;
FontExtrude = 4; //[1:.1:10]
//Line Spacing
LineSpace = 1.1; //[0:.1:2]


/* [Hidden] */
stlortext = "text";

//The following is to import an STL File. Change "stlortext" to ="stl"
//and copy the STL file to the same folder as your .scad file
stlfile = "koss_insert.stl";
//Shift STL [x,y,z]
stlshift = [0,9,0];
//Scale STL [x,y,z] axis
stlscale = [1,1,1];
//Rotate STL about [x,y,z] axis
stlrotate = [0,0,0];

/* [Hidden] */
//Referenced constants for the TAB.
//Tshiftx = 15;
tabX = 28;
tabY = 15;
tabZ = 4.70;
tabHead = 1;
tabClip = 2;
rad=tabClip/2;

if (stlortext == "stl") {
    union(){
        translate([stlshift[0],stlshift[1],stlshift[2]]) scale([stlscale[0],stlscale[1],stlscale[2]]) rotate([stlrotate[0],stlrotate[1],stlrotate[2]]) import(stlfile);
        TAB();
    }
}
else if (stlortext == "text") {TextClip();}
else echo("error");


//
//Add Text. Line 4 at bottom and Line 1 at the Top
module TextClip (){
    union(){
        TAB();
        len_text = len(line4);
        translate([-((len_text)/2)*FontSize*FontSpace,0,0]) WriteText(line4,FontSize);
        translate([-((len_text)/2)*FontSize*FontSpace,0,0]) cube([(len_text)*FontSize*FontSpace,1.5,2]);
        
        if (line3 != "") {
            len_text = len(line3);
            translate([-((len_text)/2)*FontSize*FontSpace,FontSize*LineSpace,0]) WriteText(line3,FontSize);
            translate([-((len_text)/2)*FontSize*FontSpace,FontSize*LineSpace-1,0]) cube([(len_text)*FontSize*FontSpace,1.5+1+(FontSize*(LineSpace-1)),2]);
        }
        
        if (line2 != "") {
            len_text = len(line2);
            translate([-((len_text)/2)*FontSize*FontSpace,2*FontSize*LineSpace,0]) WriteText(line2, FontSize);
            translate([-((len_text)/2)*FontSize*FontSpace,2*(FontSize*LineSpace-1),0]) cube([(len_text)*FontSize*FontSpace,1.5+1+(FontSize*(LineSpace-1)),1]);
        }
        
        if (line1 != "") {
            len_text = len(line1);
            translate([-((len_text)/2)*FontSize*FontSpace,3*FontSize*LineSpace,0]) WriteText(line1,FontSize);
            translate([-((len_text)/2)*FontSize*FontSpace,3*(FontSize*LineSpace-1),0]) cube([(len_text)*FontSize*FontSpace,1.5+1+(FontSize*(LineSpace-1)),1]);
        }
    }
}


module WriteText (textstring, fontsize){
    len_text = len(textstring);
    for (i=[0:1:(len_text-1)]) {
        if(textstring[i]=="i"){
            translate([((i+.5)*FontSpace*FontSize),0,0]) HighDots(textstring[i]);
        }
        else if(textstring[i]=="j"){
            translate([((i+.5)*FontSpace*FontSize),0,0]) HighDots(textstring[i]);
        }
        else if(textstring[i]=="?"){
            translate([((i+.5)*FontSpace*FontSize),0,0]) LowDots(textstring[i]);
        }
        else if(textstring[i]=="!"){
            translate([((i+.5)*FontSpace*FontSize),0,0]) LowDots(textstring[i]);
        }
        else if(textstring[i]==":"){
            translate([((i+.5)*FontSpace*FontSize),0,0]) LowDots(textstring[i]);
        }
        else if(textstring[i]==";"){
            translate([((i+.5)*FontSpace*FontSize),0,0]) LowDots(textstring[i]);
        }
        else {
            translate([((i+.5)*FontSpace*FontSize),0,0]) {
            linear_extrude(height=FontExtrude,convexity=10)
                text(textstring[i],size=FontSize,font=FontName,halign="center",valign="baseline");
            }
        }
    }
}
module HighDots(letter){
     union(){
         translate([0,0,0]) hull(){
             difference(){
                linear_extrude(1) text(letter,size=FontSize,font=FontName,halign="center",valign="baseline");
                translate([-FontSize/2,-(FontSize)/3,-0.5]) cube([FontSize,FontSize,2]);
             }
         }
         linear_extrude(height=FontExtrude,convexity=10)
            text(letter,size=FontSize,font=FontName,halign="center",valign="baseline");
        }
}
 module LowDots(letter){
     union(){
         translate([0,0,0]) hull(){
             difference(){
                 linear_extrude(1) text(letter,size=FontSize,font=FontName,halign="center",valign="baseline");
                 translate([-FontSize/2,FontSize/3,-0.5]) cube([FontSize,FontSize,2]);
             }
         }
         linear_extrude(height=FontExtrude,convexity=10)
            text(letter,size=FontSize,font=FontName,halign="center",valign="baseline");
        }
}
 
//
//Draw the tab.
module TAB (){
    rotate([0,0,180]) difference(){
        hull(){ //outer shell
            translate([-tabX/2,2,0]) cube([tabX,tabY,tabZ]);
            translate([-tabX/2,-tabHead,0]) cube([tabX,tabHead,tabZ]);
            translate([-((tabX/2)-rad),tabY+tabClip-rad,0]) cylinder(h=tabZ, r=rad, $fn=25);
            translate([((tabX/2)-rad),tabY+tabClip-rad,0]) cylinder(h=tabZ, r=rad, $fn=25);
        }
        translate([-(tabX*1.1)/2,-tabHead-.1,2]) cube(size=[tabX*1.1,tabY+tabHead+.1,tabZ]);
        translate([-(tabX*1.1)/2,tabY+(0.3*tabClip),tabZ]) rotate([-40,0,0]) cube([tabX*1.1,10,5]);
    }
}
